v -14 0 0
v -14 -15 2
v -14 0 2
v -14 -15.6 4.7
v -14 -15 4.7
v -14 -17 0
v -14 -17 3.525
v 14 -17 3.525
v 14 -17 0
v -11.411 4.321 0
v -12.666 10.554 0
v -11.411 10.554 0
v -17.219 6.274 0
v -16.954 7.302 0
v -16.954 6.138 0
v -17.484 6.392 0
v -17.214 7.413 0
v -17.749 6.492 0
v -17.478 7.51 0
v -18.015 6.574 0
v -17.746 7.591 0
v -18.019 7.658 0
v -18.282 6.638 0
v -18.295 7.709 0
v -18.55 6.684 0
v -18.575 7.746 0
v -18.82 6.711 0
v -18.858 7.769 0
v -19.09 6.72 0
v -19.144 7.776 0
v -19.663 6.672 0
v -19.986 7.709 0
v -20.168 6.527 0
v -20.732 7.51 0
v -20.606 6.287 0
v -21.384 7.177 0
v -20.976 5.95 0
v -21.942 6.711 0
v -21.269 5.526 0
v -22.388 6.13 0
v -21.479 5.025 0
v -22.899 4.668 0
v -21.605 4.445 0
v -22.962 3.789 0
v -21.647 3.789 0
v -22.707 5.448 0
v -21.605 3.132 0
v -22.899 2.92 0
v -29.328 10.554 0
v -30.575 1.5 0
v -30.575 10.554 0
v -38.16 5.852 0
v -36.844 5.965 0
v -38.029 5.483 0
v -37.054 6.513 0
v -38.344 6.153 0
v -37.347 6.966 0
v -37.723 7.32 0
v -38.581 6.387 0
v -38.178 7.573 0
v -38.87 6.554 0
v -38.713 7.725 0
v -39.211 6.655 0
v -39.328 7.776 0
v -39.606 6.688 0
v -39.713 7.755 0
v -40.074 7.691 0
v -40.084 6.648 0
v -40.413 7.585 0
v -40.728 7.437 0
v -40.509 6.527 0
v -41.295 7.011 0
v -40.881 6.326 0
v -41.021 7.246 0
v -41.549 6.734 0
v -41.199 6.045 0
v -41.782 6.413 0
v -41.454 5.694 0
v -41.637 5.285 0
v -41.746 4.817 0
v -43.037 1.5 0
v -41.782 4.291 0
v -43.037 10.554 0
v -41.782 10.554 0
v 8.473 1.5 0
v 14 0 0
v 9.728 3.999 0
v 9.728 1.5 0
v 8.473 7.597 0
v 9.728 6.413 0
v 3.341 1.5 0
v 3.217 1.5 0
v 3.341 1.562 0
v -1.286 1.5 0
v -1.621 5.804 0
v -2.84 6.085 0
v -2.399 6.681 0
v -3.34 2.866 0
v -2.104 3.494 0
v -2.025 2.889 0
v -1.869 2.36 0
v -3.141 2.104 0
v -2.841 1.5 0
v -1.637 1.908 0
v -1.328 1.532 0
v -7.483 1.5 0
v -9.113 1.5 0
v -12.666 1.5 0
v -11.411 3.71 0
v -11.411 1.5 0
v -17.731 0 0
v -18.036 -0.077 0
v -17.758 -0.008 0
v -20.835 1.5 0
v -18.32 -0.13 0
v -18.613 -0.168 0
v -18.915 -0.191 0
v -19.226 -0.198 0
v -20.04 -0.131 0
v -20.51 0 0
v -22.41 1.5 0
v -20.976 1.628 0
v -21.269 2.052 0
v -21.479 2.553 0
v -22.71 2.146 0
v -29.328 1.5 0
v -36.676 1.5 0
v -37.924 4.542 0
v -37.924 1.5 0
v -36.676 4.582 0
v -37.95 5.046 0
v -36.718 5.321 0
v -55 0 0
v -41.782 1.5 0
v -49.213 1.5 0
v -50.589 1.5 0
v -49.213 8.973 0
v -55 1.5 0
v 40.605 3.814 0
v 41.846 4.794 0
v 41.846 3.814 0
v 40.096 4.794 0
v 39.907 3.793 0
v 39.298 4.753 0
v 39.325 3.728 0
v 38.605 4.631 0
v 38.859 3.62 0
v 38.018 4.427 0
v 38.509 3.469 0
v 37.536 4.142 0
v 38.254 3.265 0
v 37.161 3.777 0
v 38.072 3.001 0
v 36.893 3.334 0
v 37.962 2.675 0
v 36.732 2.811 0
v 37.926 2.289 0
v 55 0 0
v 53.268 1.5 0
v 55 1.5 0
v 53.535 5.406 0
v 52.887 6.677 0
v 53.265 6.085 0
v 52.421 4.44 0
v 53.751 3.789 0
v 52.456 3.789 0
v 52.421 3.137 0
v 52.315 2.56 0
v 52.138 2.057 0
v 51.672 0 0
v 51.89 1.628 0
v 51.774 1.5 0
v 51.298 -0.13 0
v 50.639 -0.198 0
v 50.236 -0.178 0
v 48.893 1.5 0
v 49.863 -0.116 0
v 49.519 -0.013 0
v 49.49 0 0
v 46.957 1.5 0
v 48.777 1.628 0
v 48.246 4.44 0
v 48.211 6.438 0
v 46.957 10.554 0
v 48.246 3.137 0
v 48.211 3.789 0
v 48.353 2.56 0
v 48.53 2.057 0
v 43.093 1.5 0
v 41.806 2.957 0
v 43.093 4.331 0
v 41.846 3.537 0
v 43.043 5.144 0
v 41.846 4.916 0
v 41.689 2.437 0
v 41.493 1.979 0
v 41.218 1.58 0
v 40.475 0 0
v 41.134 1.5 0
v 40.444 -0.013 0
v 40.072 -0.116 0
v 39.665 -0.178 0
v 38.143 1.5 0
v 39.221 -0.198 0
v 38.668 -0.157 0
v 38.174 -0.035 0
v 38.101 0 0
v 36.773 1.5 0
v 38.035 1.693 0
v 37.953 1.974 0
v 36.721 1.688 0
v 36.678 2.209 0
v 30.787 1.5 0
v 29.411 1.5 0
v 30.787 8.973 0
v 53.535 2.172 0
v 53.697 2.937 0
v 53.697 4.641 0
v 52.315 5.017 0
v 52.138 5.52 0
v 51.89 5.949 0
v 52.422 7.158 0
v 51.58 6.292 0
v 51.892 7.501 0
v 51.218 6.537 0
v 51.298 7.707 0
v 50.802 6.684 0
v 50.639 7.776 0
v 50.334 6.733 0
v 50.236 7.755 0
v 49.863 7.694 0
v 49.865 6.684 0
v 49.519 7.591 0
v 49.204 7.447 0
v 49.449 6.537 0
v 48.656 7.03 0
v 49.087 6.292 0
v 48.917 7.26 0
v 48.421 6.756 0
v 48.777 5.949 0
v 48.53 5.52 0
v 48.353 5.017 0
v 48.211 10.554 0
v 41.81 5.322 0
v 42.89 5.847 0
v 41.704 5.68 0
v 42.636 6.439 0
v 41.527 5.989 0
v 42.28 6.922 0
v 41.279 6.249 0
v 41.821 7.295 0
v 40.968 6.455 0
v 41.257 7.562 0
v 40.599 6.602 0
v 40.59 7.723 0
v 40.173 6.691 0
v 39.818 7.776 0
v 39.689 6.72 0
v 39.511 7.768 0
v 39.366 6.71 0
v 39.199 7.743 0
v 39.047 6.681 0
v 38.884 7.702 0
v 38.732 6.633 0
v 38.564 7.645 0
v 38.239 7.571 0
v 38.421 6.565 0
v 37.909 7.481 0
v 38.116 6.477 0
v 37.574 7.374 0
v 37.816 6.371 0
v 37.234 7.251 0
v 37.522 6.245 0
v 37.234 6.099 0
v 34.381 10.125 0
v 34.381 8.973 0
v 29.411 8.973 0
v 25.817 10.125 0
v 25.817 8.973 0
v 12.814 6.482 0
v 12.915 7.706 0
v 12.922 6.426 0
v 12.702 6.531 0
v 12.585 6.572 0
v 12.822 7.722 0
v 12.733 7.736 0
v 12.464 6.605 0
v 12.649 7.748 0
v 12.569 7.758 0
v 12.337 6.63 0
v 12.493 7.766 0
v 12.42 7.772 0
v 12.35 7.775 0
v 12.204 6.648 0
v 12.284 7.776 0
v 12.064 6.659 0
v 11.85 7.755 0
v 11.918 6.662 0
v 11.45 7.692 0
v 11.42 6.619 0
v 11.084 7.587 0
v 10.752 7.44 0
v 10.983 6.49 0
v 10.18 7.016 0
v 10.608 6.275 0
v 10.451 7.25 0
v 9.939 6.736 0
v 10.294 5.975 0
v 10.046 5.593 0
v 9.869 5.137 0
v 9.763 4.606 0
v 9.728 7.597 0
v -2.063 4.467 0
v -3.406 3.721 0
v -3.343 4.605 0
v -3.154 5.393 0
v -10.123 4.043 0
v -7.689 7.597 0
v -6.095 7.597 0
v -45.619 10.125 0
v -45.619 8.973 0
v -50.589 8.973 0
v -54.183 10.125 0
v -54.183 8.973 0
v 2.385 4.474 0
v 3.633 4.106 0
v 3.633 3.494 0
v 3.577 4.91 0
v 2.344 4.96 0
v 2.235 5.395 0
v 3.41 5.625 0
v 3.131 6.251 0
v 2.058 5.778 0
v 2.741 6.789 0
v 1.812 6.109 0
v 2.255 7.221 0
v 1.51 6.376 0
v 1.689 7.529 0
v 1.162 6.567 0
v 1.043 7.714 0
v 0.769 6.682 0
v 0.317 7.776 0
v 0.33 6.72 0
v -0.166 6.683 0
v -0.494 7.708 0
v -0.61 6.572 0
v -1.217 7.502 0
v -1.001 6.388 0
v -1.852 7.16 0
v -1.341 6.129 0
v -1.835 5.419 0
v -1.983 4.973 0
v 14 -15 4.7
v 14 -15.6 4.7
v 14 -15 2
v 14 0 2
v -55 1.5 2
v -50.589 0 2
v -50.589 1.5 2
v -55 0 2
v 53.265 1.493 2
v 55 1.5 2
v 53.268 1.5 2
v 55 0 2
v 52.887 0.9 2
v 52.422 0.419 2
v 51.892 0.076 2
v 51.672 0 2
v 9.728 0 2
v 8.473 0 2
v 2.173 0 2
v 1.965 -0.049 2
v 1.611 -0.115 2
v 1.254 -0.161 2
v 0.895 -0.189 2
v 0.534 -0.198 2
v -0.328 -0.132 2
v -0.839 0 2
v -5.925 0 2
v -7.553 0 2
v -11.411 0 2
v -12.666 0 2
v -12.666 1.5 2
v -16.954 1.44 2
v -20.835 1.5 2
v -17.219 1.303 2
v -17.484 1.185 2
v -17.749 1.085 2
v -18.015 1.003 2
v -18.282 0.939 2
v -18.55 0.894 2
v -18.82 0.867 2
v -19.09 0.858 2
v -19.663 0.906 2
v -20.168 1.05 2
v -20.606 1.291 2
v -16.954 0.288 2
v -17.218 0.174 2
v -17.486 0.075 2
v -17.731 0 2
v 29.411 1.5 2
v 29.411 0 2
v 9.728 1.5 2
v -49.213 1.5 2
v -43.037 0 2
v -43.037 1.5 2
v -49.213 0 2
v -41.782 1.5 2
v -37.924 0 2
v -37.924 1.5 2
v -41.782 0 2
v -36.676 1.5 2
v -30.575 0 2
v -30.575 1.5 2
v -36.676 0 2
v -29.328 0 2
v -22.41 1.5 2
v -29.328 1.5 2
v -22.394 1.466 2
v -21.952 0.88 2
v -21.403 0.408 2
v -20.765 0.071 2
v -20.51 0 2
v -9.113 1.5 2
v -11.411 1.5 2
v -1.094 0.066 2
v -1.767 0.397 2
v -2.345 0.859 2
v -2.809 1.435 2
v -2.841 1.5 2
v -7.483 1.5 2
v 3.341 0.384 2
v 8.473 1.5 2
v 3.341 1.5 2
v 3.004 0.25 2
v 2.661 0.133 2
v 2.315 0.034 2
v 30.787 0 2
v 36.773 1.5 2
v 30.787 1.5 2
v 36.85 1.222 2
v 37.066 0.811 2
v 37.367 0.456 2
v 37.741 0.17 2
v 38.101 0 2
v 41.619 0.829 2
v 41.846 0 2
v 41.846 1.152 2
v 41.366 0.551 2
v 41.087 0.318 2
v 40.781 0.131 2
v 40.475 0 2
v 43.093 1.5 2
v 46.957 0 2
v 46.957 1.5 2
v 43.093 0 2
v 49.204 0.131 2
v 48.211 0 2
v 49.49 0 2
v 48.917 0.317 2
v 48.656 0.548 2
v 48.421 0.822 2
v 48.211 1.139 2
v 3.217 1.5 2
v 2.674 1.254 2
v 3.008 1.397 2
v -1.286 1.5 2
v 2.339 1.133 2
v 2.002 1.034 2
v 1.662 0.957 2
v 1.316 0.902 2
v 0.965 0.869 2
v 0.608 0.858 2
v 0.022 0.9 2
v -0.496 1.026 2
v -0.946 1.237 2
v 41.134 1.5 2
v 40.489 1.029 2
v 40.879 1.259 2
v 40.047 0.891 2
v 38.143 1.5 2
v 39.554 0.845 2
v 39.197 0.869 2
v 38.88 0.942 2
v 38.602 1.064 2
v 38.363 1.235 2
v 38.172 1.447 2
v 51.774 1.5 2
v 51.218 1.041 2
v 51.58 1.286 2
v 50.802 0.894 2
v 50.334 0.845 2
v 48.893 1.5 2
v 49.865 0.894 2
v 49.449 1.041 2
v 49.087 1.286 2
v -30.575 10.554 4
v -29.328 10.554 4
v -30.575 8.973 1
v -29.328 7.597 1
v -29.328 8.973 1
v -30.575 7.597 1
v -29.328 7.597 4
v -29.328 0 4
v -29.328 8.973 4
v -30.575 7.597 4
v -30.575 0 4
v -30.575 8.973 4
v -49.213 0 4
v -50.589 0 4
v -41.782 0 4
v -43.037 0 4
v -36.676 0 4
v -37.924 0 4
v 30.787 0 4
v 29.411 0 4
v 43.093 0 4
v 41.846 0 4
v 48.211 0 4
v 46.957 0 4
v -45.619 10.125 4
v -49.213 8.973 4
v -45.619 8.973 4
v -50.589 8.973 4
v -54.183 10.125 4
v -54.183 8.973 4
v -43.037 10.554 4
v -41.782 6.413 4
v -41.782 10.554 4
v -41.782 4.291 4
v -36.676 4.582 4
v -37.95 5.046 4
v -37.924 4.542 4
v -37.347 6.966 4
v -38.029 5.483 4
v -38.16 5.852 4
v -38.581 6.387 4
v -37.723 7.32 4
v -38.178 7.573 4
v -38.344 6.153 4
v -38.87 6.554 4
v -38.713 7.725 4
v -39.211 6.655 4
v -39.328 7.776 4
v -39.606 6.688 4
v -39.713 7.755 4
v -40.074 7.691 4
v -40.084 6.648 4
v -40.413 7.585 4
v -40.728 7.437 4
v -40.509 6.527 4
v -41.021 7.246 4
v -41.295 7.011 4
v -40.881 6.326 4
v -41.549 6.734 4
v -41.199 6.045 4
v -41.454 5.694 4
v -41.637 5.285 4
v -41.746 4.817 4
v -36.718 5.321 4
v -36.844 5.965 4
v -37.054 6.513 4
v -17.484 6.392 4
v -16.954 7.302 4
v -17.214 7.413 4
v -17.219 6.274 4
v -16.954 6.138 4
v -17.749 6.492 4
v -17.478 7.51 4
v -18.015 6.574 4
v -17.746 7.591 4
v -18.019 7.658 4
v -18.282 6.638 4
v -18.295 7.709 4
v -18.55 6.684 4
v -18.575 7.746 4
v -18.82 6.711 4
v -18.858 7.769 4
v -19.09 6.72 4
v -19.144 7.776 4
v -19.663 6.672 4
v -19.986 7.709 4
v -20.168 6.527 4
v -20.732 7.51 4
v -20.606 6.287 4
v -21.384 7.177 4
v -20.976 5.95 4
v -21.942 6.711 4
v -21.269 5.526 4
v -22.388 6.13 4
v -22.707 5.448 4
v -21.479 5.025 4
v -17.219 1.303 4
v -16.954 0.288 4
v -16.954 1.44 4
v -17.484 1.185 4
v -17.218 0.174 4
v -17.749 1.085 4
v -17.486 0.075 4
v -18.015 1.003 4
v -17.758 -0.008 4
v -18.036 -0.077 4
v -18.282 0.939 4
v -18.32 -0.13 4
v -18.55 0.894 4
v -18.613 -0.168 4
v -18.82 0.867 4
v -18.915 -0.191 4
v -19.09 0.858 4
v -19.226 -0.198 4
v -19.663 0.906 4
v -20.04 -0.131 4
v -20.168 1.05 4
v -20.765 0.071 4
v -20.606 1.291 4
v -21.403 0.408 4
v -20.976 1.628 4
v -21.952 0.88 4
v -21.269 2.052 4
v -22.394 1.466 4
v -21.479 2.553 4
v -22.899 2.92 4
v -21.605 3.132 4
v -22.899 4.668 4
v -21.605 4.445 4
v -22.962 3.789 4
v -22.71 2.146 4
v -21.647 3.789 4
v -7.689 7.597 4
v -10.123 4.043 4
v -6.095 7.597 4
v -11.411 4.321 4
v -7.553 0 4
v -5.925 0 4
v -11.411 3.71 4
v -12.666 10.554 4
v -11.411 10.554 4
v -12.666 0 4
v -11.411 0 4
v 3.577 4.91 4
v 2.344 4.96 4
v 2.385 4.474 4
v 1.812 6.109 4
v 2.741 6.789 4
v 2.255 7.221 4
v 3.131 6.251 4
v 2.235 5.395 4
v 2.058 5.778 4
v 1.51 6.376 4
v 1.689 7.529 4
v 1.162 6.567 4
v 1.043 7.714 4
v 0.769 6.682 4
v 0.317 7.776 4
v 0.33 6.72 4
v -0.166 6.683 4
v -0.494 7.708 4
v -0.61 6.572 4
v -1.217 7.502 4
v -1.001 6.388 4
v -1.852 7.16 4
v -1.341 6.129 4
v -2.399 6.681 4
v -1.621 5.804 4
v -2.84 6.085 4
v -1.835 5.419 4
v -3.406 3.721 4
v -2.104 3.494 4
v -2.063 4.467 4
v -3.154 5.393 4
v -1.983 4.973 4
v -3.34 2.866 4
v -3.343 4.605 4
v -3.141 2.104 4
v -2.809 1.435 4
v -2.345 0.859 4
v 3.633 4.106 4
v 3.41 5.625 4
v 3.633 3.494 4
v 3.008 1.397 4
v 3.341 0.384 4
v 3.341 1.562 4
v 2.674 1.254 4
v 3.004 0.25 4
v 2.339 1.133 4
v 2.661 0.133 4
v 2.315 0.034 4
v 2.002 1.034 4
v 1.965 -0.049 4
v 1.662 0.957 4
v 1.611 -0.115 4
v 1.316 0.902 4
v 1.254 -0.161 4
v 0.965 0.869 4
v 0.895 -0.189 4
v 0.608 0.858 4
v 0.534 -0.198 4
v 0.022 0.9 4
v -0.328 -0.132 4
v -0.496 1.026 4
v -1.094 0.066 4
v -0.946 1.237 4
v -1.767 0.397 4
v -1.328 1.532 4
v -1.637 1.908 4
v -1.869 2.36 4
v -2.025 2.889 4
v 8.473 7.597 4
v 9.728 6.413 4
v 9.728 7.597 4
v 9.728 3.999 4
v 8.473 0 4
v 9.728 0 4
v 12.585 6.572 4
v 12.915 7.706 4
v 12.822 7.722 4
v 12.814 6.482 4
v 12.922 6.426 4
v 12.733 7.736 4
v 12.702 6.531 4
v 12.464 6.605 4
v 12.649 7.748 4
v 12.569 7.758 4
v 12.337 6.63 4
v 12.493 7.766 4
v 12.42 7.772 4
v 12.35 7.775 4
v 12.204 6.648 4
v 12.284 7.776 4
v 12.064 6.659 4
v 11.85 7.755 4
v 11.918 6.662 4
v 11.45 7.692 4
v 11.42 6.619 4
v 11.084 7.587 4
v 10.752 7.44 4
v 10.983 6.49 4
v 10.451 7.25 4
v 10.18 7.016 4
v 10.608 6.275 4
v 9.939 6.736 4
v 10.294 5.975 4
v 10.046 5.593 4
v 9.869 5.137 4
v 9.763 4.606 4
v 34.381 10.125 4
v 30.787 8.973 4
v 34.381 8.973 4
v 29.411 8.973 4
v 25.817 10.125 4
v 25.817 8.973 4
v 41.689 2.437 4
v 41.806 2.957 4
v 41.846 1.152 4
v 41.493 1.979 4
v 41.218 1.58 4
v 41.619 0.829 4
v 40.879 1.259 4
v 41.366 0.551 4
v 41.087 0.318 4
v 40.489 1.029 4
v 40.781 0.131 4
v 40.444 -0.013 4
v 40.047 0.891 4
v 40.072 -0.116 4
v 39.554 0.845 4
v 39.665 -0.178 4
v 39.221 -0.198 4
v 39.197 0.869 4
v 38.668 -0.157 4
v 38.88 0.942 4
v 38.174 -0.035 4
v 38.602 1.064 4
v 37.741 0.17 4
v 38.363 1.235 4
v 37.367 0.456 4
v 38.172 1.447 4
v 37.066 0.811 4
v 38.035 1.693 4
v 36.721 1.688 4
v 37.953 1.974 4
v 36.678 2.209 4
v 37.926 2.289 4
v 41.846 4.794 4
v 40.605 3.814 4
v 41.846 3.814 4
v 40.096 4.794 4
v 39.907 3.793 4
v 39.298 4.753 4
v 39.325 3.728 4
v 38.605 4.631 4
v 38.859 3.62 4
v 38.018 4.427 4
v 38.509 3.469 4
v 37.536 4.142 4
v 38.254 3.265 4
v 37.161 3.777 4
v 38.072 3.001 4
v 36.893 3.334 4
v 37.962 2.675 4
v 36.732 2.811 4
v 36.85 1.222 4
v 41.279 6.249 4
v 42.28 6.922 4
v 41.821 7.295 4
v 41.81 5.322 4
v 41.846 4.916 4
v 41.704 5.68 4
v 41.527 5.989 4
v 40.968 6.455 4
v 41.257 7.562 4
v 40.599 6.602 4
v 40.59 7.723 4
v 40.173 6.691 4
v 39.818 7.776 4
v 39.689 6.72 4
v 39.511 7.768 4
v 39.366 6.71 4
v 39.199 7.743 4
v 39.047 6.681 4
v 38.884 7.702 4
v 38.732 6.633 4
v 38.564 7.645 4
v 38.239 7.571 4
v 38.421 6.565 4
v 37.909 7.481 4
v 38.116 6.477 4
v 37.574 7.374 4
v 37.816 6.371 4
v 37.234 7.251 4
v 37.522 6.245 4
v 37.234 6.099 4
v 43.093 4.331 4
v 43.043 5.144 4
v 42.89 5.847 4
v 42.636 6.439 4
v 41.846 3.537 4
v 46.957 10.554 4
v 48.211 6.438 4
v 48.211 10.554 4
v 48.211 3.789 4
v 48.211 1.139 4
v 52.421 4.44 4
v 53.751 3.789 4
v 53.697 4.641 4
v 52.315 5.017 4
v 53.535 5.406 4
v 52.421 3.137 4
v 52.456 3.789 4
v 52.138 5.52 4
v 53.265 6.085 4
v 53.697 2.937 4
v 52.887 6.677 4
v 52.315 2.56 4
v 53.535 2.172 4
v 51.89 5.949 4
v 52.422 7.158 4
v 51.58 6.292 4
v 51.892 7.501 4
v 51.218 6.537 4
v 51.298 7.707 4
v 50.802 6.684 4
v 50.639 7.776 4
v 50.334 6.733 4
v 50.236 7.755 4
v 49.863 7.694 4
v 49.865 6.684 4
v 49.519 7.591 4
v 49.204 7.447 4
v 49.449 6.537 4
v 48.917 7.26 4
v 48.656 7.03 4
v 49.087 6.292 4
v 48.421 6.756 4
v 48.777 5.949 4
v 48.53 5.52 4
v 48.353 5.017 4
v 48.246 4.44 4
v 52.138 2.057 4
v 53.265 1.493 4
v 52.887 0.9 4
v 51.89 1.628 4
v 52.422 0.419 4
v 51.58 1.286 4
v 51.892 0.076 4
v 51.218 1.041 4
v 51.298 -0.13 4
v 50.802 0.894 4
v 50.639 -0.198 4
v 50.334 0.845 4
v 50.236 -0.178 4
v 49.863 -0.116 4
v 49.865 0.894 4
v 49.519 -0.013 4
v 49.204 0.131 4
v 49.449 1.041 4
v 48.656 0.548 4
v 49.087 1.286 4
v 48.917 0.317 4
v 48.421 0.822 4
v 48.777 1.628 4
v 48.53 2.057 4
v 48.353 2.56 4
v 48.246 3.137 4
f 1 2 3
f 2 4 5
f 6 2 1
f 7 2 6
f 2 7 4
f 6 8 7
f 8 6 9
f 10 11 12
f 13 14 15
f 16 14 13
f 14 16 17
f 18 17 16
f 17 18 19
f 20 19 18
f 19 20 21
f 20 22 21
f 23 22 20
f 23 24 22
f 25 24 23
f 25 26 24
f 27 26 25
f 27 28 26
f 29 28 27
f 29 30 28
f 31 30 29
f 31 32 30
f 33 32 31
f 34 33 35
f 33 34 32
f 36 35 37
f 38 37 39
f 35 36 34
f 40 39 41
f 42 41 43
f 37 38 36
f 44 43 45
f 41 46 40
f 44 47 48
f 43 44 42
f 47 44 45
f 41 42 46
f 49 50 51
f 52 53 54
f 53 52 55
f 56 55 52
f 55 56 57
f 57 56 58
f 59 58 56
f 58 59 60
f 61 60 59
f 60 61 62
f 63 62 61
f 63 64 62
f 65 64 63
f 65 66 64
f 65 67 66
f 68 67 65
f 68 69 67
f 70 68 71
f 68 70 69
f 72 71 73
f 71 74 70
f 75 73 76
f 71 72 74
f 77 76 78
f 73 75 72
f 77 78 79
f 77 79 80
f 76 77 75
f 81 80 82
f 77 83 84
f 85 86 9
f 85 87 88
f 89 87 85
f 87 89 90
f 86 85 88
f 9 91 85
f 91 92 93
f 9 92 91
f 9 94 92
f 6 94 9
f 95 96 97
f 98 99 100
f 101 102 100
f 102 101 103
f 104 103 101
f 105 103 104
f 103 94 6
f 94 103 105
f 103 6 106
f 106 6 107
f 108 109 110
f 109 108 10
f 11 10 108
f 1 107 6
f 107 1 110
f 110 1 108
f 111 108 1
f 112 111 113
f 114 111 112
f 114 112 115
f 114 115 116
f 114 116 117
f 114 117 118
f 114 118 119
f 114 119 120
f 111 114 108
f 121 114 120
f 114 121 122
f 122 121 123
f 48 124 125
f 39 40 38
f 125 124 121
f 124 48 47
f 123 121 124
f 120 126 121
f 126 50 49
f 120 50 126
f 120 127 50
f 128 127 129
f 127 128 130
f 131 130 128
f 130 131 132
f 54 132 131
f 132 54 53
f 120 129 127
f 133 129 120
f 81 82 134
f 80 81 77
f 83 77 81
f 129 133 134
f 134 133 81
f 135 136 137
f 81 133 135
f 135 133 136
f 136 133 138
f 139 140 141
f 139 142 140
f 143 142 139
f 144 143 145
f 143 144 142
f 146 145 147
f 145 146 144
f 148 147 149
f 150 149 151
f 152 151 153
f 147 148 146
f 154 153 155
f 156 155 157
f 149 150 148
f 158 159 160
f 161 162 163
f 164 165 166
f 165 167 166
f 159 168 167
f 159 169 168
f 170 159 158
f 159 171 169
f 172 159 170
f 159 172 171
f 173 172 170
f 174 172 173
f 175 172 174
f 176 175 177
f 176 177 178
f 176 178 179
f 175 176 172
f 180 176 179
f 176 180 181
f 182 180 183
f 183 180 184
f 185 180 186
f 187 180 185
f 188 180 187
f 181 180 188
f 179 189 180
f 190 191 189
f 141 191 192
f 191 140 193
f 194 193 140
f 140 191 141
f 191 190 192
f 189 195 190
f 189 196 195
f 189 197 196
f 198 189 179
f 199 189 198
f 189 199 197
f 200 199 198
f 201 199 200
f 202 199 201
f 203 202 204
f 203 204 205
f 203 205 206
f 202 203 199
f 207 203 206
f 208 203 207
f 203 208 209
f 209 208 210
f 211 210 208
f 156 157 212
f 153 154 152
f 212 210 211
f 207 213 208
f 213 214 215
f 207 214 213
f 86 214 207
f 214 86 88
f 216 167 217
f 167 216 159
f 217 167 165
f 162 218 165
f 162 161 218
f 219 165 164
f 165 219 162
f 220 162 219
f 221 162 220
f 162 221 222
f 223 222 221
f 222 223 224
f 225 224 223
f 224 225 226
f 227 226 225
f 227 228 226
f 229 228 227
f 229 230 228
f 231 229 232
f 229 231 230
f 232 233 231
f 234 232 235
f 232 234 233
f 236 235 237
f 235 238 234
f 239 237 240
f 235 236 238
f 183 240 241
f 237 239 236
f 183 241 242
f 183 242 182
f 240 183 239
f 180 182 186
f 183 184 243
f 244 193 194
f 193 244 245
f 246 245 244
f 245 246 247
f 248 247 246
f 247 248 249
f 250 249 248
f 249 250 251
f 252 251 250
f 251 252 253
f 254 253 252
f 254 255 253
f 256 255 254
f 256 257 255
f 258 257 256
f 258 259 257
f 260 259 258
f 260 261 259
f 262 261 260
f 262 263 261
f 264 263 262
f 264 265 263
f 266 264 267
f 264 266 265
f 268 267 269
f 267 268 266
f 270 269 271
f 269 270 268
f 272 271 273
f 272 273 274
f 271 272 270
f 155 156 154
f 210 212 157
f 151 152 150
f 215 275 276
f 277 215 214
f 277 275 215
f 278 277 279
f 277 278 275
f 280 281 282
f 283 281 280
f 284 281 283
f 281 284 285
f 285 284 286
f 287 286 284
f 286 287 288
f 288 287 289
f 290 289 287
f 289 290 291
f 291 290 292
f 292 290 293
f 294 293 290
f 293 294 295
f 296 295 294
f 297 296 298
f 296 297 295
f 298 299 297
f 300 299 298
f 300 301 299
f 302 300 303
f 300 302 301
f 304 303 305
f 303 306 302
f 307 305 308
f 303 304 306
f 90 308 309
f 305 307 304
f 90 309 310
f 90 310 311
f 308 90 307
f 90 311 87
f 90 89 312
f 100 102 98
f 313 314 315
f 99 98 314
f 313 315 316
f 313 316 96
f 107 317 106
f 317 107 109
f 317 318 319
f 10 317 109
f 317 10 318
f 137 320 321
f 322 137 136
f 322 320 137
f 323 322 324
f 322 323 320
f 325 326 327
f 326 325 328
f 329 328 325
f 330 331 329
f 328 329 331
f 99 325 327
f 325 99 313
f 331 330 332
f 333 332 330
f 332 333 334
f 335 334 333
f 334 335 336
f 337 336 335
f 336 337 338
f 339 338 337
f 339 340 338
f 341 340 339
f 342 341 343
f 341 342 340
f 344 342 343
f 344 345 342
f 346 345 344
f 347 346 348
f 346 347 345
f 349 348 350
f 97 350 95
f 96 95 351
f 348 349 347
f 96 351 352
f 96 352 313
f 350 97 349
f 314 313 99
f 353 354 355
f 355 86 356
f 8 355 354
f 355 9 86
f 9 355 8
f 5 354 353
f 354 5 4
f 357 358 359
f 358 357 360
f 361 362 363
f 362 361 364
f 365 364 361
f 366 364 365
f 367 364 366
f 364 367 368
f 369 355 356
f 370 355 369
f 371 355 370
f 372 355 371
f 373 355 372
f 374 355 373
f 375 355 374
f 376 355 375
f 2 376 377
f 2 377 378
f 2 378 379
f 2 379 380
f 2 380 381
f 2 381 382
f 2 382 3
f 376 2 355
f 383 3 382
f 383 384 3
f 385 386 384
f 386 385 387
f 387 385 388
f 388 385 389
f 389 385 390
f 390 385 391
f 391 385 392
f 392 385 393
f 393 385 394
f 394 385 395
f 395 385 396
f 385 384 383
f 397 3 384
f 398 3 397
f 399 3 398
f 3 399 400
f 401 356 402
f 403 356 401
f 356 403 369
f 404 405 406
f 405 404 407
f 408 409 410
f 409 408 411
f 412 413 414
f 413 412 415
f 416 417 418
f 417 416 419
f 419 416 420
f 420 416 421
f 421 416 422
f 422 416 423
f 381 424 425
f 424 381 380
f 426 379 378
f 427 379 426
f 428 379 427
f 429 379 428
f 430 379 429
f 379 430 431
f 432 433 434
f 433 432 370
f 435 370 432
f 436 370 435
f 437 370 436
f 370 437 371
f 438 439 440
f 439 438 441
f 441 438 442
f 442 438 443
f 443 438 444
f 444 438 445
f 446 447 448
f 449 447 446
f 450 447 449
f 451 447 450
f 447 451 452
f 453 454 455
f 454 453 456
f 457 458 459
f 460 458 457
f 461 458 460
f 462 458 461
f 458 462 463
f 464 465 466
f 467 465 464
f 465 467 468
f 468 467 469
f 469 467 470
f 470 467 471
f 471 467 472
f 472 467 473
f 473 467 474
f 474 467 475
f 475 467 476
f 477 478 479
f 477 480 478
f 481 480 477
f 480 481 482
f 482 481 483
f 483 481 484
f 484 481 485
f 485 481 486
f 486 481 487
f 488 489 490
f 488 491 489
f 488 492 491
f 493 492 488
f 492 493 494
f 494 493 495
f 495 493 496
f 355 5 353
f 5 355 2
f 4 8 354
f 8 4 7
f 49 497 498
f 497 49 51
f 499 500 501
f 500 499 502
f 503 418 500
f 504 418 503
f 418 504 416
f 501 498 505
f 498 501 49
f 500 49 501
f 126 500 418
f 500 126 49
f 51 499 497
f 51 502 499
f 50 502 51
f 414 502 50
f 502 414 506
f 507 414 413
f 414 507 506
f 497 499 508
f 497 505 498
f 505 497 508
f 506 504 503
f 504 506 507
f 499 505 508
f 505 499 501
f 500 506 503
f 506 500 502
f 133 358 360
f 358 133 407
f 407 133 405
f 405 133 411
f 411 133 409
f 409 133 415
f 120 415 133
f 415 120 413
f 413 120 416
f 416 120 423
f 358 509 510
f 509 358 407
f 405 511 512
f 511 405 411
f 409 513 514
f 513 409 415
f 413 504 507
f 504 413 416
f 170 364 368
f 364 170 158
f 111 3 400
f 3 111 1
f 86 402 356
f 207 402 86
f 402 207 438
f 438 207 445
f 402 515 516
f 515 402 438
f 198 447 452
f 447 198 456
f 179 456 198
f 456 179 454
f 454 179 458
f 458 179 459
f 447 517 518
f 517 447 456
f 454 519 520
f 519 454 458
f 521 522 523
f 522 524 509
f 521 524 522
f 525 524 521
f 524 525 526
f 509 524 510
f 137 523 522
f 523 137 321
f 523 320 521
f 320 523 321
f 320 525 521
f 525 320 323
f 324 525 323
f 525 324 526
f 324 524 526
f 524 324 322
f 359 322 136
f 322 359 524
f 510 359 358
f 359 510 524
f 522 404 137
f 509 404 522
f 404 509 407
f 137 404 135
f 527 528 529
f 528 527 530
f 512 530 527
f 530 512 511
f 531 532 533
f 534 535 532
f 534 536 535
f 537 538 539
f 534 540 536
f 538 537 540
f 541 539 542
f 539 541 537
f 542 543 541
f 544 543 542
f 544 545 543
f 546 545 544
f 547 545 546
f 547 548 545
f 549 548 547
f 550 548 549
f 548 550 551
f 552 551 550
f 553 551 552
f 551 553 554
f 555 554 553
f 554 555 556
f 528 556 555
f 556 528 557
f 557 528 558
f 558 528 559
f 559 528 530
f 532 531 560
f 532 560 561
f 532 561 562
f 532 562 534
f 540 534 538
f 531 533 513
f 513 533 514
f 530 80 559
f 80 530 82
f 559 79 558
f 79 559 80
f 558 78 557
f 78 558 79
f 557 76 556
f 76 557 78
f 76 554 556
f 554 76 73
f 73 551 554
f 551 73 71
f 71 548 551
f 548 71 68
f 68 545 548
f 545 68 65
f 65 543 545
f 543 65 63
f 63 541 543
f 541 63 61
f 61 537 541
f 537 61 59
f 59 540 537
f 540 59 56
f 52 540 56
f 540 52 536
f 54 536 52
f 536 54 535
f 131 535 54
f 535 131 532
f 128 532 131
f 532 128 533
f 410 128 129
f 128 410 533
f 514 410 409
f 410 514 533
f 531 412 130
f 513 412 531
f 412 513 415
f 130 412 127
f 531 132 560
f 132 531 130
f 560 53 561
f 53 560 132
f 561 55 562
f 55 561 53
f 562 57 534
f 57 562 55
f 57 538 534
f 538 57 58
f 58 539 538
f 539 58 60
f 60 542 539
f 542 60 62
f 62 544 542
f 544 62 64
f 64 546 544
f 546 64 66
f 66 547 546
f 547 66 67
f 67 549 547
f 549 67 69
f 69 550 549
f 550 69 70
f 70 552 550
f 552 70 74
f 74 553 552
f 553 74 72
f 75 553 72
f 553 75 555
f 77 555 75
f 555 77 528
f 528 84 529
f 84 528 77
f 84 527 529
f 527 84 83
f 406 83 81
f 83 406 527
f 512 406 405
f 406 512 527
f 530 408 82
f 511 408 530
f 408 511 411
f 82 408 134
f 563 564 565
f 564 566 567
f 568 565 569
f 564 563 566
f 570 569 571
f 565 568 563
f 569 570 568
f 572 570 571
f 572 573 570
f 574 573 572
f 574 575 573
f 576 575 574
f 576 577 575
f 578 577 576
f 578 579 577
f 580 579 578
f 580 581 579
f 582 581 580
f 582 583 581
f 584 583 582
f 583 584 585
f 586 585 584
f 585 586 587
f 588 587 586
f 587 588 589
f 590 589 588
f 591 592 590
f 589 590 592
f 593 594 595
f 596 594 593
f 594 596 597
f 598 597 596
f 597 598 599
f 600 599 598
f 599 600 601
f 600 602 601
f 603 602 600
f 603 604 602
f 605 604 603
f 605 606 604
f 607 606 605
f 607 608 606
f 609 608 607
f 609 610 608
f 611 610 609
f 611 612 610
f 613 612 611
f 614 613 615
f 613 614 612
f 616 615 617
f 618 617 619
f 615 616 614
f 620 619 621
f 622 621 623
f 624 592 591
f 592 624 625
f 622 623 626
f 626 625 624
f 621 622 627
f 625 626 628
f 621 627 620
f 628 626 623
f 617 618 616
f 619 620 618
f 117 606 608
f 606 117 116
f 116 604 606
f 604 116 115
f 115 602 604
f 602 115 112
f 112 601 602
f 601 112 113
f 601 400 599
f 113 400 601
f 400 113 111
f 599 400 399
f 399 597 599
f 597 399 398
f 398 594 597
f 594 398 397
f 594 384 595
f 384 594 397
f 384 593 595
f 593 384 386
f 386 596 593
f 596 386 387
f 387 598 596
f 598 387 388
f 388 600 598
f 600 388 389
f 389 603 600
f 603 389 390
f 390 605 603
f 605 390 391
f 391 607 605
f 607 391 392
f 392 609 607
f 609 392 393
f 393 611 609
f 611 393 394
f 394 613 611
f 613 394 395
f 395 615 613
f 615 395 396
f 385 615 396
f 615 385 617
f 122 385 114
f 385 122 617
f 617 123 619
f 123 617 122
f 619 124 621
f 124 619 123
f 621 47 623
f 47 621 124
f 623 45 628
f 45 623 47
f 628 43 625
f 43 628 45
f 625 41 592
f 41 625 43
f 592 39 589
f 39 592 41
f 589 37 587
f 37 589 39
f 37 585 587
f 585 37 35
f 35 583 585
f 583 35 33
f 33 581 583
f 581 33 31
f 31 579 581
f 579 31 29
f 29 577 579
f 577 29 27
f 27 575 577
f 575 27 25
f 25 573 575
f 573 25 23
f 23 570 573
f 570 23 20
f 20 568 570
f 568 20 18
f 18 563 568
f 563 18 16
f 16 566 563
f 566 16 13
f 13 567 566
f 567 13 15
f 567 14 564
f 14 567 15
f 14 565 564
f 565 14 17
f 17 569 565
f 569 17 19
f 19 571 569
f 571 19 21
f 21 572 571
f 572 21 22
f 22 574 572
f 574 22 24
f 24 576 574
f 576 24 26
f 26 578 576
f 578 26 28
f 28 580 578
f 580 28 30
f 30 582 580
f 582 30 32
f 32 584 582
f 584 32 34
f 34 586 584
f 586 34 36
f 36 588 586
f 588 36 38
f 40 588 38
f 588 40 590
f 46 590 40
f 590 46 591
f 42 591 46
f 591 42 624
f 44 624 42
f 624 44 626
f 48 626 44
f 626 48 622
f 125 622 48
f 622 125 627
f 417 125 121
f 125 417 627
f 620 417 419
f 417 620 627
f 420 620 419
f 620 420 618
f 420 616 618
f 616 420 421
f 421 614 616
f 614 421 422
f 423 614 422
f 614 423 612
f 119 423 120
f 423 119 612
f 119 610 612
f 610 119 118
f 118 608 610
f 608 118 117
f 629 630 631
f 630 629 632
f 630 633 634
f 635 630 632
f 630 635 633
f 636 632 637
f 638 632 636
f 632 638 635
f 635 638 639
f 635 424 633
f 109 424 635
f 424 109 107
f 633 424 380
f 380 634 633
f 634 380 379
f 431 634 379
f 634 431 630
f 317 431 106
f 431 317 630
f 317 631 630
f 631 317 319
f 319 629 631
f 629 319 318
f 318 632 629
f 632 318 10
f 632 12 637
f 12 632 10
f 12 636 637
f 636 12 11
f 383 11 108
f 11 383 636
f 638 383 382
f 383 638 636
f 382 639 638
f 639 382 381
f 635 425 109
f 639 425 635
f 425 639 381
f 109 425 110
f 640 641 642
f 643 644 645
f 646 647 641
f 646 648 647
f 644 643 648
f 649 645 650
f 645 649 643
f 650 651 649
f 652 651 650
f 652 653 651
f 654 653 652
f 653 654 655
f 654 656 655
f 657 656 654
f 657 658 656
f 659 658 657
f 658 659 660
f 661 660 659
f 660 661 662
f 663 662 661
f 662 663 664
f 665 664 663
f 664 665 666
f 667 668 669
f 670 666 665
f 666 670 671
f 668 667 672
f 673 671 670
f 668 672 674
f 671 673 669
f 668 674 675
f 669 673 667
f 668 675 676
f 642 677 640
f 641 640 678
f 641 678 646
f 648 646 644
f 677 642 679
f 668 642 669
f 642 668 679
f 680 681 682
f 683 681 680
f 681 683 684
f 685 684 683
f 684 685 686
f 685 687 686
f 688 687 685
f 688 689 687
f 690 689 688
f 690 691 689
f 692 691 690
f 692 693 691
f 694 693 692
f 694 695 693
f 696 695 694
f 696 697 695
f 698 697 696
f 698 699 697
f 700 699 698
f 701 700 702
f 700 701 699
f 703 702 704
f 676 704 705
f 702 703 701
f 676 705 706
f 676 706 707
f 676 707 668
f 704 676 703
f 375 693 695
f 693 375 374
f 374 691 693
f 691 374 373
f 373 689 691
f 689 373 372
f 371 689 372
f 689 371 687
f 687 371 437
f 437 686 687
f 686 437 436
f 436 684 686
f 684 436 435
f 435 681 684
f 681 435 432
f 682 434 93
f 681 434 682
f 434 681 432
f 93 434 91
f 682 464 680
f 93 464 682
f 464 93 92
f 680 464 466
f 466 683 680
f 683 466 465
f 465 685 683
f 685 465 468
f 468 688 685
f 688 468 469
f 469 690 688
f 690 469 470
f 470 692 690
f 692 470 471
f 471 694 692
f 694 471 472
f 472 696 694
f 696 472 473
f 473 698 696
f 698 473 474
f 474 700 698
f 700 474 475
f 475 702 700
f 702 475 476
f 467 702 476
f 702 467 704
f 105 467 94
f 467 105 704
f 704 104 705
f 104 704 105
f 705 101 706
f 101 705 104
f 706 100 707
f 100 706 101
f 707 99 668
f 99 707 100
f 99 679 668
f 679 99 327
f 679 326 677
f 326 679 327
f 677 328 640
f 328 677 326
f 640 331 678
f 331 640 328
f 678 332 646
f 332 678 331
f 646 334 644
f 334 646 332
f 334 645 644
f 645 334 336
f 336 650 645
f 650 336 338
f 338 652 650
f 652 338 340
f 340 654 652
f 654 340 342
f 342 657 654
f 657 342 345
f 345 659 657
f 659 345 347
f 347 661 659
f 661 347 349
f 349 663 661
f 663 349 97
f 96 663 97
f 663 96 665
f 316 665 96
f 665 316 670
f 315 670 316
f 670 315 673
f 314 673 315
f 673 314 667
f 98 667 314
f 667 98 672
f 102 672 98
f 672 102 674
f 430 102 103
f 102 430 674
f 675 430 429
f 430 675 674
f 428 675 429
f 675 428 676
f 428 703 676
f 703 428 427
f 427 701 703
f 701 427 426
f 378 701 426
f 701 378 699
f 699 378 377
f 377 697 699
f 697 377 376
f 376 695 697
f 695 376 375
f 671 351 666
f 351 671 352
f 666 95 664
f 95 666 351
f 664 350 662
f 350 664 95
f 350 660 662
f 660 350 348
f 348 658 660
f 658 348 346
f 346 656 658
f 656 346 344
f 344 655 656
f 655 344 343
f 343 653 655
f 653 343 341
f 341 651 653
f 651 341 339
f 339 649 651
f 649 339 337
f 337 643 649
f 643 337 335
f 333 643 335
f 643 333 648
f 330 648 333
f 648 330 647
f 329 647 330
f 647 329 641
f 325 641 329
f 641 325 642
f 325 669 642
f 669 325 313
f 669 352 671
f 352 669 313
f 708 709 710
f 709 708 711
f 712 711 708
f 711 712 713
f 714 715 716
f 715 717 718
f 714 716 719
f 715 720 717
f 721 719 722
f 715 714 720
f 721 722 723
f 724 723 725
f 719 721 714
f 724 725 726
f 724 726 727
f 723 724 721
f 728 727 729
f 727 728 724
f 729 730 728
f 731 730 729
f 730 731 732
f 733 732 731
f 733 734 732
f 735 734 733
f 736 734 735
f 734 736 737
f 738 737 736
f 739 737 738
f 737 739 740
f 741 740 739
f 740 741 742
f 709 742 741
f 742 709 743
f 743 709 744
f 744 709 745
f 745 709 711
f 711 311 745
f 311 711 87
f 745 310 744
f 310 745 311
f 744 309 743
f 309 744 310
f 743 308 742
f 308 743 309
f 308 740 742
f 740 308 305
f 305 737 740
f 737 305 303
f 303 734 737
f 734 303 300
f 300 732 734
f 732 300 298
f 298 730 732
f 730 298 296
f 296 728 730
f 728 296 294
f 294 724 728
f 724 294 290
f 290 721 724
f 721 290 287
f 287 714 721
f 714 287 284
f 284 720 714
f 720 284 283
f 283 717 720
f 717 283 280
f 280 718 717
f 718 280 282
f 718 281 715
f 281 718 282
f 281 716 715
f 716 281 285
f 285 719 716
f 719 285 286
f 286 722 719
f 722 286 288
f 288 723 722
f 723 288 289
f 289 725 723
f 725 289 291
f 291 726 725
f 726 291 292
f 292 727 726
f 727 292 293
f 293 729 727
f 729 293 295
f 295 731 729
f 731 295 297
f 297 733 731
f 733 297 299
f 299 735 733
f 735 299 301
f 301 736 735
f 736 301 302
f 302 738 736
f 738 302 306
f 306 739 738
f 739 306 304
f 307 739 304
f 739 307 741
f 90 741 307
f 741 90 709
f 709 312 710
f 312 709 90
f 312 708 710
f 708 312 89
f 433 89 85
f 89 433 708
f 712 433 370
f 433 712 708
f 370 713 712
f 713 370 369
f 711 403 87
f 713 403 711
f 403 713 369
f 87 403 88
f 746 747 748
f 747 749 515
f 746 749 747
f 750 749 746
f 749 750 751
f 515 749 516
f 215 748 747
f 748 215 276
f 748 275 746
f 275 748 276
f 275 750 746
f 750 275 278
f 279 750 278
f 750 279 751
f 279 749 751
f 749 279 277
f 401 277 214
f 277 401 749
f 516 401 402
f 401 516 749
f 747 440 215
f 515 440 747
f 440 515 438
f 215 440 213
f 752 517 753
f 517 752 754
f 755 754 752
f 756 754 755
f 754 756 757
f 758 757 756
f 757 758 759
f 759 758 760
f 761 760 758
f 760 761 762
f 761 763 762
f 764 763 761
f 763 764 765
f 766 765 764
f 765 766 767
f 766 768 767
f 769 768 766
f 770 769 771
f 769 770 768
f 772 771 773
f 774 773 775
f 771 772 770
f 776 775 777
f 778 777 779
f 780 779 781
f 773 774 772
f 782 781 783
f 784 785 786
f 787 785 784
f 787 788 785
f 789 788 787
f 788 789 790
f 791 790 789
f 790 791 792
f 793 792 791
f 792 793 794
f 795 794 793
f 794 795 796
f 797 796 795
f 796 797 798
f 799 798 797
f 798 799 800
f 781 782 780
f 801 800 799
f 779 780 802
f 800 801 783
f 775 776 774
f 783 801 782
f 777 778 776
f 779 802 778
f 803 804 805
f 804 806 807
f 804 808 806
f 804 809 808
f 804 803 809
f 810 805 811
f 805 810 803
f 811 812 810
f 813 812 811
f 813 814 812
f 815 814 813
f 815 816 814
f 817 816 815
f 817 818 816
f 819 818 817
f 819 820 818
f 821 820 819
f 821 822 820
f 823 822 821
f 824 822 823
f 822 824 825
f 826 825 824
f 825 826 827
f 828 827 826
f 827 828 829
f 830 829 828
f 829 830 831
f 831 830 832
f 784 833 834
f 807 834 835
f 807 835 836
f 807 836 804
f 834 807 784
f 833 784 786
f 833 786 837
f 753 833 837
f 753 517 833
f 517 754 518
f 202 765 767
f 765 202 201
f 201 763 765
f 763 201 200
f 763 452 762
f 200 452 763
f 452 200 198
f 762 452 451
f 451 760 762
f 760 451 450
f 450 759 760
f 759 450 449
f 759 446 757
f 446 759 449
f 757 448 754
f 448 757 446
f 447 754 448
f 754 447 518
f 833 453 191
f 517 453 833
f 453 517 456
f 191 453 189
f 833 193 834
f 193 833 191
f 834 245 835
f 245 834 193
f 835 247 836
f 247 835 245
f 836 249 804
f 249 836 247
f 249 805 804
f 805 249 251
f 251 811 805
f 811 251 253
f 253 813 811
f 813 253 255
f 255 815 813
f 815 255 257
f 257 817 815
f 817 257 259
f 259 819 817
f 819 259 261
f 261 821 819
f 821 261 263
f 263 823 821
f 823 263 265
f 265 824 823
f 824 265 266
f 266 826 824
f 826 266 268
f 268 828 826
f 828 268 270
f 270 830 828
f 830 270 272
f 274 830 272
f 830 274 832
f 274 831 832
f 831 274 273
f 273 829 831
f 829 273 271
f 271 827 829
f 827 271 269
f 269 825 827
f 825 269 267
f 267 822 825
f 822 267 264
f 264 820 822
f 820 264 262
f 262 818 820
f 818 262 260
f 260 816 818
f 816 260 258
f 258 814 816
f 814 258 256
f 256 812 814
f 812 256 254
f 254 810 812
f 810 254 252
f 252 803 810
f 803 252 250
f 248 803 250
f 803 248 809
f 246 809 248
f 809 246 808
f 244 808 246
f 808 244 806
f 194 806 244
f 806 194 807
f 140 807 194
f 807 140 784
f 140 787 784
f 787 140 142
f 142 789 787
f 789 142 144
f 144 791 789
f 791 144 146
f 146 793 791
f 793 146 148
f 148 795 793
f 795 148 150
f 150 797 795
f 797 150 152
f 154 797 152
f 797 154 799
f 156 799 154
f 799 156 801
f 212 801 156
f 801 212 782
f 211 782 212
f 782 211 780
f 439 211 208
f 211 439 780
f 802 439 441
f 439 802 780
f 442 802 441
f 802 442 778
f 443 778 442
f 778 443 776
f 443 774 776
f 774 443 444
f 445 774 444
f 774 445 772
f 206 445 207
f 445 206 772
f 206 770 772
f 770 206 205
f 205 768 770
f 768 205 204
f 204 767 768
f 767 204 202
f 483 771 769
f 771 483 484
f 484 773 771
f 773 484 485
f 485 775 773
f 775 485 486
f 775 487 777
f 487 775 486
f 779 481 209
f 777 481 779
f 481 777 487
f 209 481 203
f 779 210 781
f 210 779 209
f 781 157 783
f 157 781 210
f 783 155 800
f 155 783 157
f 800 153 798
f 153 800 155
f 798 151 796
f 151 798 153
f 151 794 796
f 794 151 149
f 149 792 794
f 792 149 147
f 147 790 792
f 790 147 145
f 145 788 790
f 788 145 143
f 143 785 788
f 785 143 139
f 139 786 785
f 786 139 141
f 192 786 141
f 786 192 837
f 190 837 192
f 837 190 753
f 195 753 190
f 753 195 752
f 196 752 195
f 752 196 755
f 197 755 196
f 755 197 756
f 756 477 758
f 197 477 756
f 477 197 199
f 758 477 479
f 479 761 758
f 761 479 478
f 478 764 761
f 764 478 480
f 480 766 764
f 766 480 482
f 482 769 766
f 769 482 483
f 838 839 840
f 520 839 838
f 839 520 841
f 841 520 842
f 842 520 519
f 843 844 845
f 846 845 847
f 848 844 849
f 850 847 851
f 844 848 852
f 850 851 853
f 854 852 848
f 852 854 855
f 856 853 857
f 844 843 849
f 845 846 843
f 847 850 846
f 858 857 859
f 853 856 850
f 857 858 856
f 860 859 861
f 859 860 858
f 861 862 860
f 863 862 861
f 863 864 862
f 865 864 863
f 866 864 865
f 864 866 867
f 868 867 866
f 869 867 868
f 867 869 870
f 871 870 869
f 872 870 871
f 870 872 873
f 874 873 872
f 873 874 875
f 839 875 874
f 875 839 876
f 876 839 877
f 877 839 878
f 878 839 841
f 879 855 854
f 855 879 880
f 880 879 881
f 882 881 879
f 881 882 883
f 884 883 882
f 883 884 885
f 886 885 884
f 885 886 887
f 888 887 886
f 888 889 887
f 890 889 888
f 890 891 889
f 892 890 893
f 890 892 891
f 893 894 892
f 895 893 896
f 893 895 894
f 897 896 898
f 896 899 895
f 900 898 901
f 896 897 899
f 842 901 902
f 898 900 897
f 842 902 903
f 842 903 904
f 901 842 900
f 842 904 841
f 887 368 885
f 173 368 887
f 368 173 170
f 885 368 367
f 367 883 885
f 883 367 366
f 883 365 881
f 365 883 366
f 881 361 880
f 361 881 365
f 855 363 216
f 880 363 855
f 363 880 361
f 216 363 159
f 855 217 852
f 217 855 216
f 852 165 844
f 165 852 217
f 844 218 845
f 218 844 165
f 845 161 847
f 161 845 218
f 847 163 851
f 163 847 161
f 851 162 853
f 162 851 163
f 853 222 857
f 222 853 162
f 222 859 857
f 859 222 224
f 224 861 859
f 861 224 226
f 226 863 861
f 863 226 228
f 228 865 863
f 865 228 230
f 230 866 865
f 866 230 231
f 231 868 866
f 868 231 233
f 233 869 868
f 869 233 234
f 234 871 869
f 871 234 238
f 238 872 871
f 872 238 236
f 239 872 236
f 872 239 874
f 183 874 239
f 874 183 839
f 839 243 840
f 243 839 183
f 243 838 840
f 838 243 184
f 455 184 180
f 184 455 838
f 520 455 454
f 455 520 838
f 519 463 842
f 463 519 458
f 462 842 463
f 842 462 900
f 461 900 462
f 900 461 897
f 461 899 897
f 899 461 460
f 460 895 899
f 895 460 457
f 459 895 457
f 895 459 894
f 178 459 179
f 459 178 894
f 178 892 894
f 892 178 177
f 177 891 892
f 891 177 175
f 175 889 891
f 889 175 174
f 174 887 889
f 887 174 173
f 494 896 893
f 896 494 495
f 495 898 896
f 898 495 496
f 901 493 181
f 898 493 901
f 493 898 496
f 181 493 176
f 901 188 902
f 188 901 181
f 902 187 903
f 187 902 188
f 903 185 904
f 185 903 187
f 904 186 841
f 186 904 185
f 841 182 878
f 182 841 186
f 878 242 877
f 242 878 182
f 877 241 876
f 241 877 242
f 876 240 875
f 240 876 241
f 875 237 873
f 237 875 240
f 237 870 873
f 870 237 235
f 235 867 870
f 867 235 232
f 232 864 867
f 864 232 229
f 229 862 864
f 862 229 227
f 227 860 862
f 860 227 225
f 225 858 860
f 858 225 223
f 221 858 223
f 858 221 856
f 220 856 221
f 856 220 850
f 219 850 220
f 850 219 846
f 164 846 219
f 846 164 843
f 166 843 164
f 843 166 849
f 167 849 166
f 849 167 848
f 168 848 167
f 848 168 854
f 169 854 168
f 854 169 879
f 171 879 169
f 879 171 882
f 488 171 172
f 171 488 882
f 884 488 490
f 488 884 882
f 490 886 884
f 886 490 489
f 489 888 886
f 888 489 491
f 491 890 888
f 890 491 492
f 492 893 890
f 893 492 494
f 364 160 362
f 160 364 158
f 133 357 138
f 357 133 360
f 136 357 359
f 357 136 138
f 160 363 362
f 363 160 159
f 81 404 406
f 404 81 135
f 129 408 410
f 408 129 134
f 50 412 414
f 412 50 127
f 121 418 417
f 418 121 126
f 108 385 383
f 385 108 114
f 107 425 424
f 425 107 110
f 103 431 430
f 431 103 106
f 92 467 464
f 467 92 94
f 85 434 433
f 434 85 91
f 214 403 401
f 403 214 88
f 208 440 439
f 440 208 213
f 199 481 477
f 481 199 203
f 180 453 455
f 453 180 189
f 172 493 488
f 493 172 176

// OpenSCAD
//Hardhat accessory slot tab
//Writen by Dan Koss 1/2016. (Updated 1/23/16)
//Thanks to MC Geisler (thing:714444) for the font list. I'm still figuring out text and will trim don the list as I learn.
//Choose to import STL or Use custom text

/* [Add Text] */
//Text Line 1
line1 = "";
//Text Line 2
line2 = "";
//Text Line 3
line3 = "";
//Text Line 4
line4 = "Thicker Tab";

//Font name, e.g. "Libration Sans", "Aldo", depends on what is available on the platform. In the customizer,choose from about 700 Google Fonts. For an overview please refer: http://www.google.com/fonts
FontName="Alike"; //[ABeeZee,Abel,Abril Fatface,Aclonica,Acme,Actor,Adamina,Advent Pro,Aguafina Script,Akronim,Aladin,Aldrich,Alef,Alegreya,Alegreya Sans,Alegreya Sans SC,Alegreya SC,Alex Brush,Alfa Slab One,Alice,Alike,Alike Angular,Allan,Allerta,Allerta Stencil,Allura,Almendra,Almendra Display,Almendra SC,Amarante,Amaranth,Amatic SC,Amethysta,Amiri,Anaheim,Andada,Andika,Angkor,Annie Use Your Telescope,Anonymous Pro,Antic,Antic Didone,Antic Slab,Anton,Arapey,Arbutus,Arbutus Slab,Architects Daughter,Archivo Black,Archivo Narrow,Arimo,Arizonia,Armata,Artifika,Arvo,Asap,Asset,Astloch,Asul,Atomic Age,Aubrey,Audiowide,Autour One,Average,Average Sans,Averia Gruesa Libre,Averia Libre,Averia Sans Libre,Averia Serif Libre,Bad Script,Balthazar,Bangers,Basic,Battambang,Baumans,Bayon,Belgrano,Belleza,BenchNine,Bentham,Berkshire Swash,Bevan,Bigelow Rules,Bigshot One,Bilbo,Bilbo Swash Caps,Bitter,Black Ops One,Bokor,Bonbon,Boogaloo,Bowlby One,Bowlby One SC,Brawler,Bree Serif,Bubblegum Sans,Bubbler One,Buda,Buenard,Butcherman,Butterfly Kids,Cabin,Cabin Condensed,Cabin Sketch,Caesar Dressing,Cagliostro,Calligraffitti,Cambay,Cambo,Candal,Cantarell,Cantata One,Cantora One,Capriola,Cardo,Carme,Carrois Gothic,Carrois Gothic SC,Carter One,Caudex,Cedarville Cursive,Ceviche One,Changa One,Chango,Chau Philomene One,Chela One,Chelsea Market,Chenla,Cherry Cream Soda,Cherry Swash,Chewy,Chicle,Chivo,Cinzel,Cinzel Decorative,Clicker Script,Coda,Coda Caption,Codystar,Combo,Comfortaa,Coming Soon,Concert One,Condiment,Content,Contrail One,Convergence,Cookie,Copse,Corben,Courgette,Cousine,Coustard,Covered By Your Grace,Crafty Girls,Creepster,Crete Round,Crimson Text,Croissant One,Crushed,Cuprum,Cutive,Cutive Mono,Damion,Dancing Script,Dangrek,Dawning of a New Day,Days One,Dekko,Delius,Delius Swash Caps,Delius Unicase,Della Respira,Denk One,Devonshire,Dhurjati,Didact Gothic,Diplomata,Diplomata SC,Domine,Donegal One,Doppio One,Dorsa,Dosis,Dr Sugiyama,Droid Sans,Droid Sans Mono,Droid Serif,Duru Sans,Dynalight,Eagle Lake,Eater,EB Garamond,Economica,Ek Mukta,Electrolize,Elsie,Elsie Swash Caps,Emblema One,Emilys Candy,Engagement,Englebert,Enriqueta,Erica One,Esteban,Euphoria Script,Ewert,Exo,Exo 2,Expletus Sans,Fanwood Text,Fascinate,Fascinate Inline,Faster One,Fasthand,Fauna One,Federant,Federo,Felipa,Fenix,Finger Paint,Fira Mono,Fira Sans,Fjalla One,Fjord One,Flamenco,Flavors,Fondamento,Fontdiner Swanky,Forum,Francois One,Freckle Face,Fredericka the Great,Fredoka One,Freehand,Fresca,Frijole,Fruktur,Fugaz One,Gabriela,Gafata,Galdeano,Galindo,Gentium Basic,Gentium Book Basic,Geo,Geostar,Geostar Fill,Germania One,GFS Didot,GFS Neohellenic,Gidugu,Gilda Display,Give You Glory,Glass Antiqua,Glegoo,Gloria Hallelujah,Goblin One,Gochi Hand,Gorditas,Goudy Bookletter 1911,Graduate,Grand Hotel,Gravitas One,Great Vibes,Griffy,Gruppo,Gudea,Gurajada,Habibi,Halant,Hammersmith One,Hanalei,Hanalei Fill,Handlee,Hanuman,Happy Monkey,Headland One,Henny Penny,Herr Von Muellerhoff,Hind,Holtwood One SC,Homemade Apple,Homenaje,Iceberg,Iceland,IM Fell Double Pica,IM Fell Double Pica SC,IM Fell DW Pica,IM Fell DW Pica SC,IM Fell English,IM Fell English SC,IM Fell French Canon,IM Fell French Canon SC,IM Fell Great Primer,IM Fell Great Primer SC,Imprima,Inconsolata,Inder,Indie Flower,Inika,Irish Grover,Istok Web,Italiana,Italianno,Jacques Francois,Jacques Francois Shadow,Jim Nightshade,Jockey One,Jolly Lodger,Josefin Sans,Josefin Slab,Joti One,Judson,Julee,Julius Sans One,Junge,Jura,Just Another Hand,Just Me Again Down Here,Kalam,Kameron,Kantumruy,Karla,Karma,Kaushan Script,Kavoon,Kdam Thmor,Keania One,Kelly Slab,Kenia,Khand,Khmer,Khula,Kite One,Knewave,Kotta One,Koulen,Kranky,Kreon,Kristi,Krona One,La Belle Aurore,Laila,Lakki Reddy,Lancelot,Lateef,Lato,League Script,Leckerli One,Ledger,Lekton,Lemon,Liberation Sans,Libre Baskerville,Life Savers,Lilita One,Lily Script One,Limelight,Linden Hill,Lobster,Lobster Two,Londrina Outline,Londrina Shadow,Londrina Sketch,Londrina Solid,Lora,Love Ya Like A Sister,Loved by the King,Lovers Quarrel,Luckiest Guy,Lusitana,Lustria,Macondo,Macondo Swash Caps,Magra,Maiden Orange,Mako,Mallanna,Mandali,Marcellus,Marcellus SC,Marck Script,Margarine,Marko One,Marmelad,Martel Sans,Marvel,Mate,Mate SC,Maven Pro,McLaren,Meddon,MedievalSharp,Medula One,Megrim,Meie Script,Merienda,Merienda One,Merriweather,Merriweather Sans,Metal,Metal Mania,Metamorphous,Metrophobic,Michroma,Milonga,Miltonian,Miltonian Tattoo,Miniver,Miss Fajardose,Modak,Modern Antiqua,Molengo,Molle,Monda,Monofett,Monoton,Monsieur La Doulaise,Montaga,Montez,Montserrat,Montserrat Alternates,Montserrat Subrayada,Moul,Moulpali,Mountains of Christmas,Mouse Memoirs,Mr Bedfort,Mr Dafoe,Mr De Haviland,Mrs Saint Delafield,Mrs Sheppards,Muli,Mystery Quest,Neucha,Neuton,New Rocker,News Cycle,Niconne,Nixie One,Nobile,Nokora,Norican,Nosifer,Nothing You Could Do,Noticia Text,Noto Sans,Noto Serif,Nova Cut,Nova Flat,Nova Mono,Nova Oval,Nova Round,Nova Script,Nova Slim,Nova Square,NTR,Numans,Nunito,Odor Mean Chey,Offside,Old Standard TT,Oldenburg,Oleo Script,Oleo Script Swash Caps,Open Sans,Open Sans Condensed,Oranienbaum,Orbitron,Oregano,Orienta,Original Surfer,Oswald,Over the Rainbow,Overlock,Overlock SC,Ovo,Oxygen,Oxygen Mono,Pacifico,Paprika,Parisienne,Passero One,Passion One,Pathway Gothic One,Patrick Hand,Patrick Hand SC,Patua One,Paytone One,Peddana,Peralta,Permanent Marker,Petit Formal Script,Petrona,Philosopher,Piedra,Pinyon Script,Pirata One,Plaster,Play,Playball,Playfair Display,Playfair Display SC,Podkova,Poiret One,Poller One,Poly,Pompiere,Pontano Sans,Port Lligat Sans,Port Lligat Slab,Prata,Preahvihear,Press Start 2P,Princess Sofia,Prociono,Prosto One,PT Mono,PT Sans,PT Sans Caption,PT Sans Narrow,PT Serif,PT Serif Caption,Puritan,Purple Purse,Quando,Quantico,Quattrocento,Quattrocento Sans,Questrial,Quicksand,Quintessential,Qwigley,Racing Sans One,Radley,Rajdhani,Raleway,Raleway Dots,Ramabhadra,Ramaraja,Rambla,Rammetto One,Ranchers,Rancho,Ranga,Rationale,Ravi Prakash,Redressed,Reenie Beanie,Revalia,Ribeye,Ribeye Marrow,Righteous,Risque,Roboto,Roboto Condensed,Roboto Slab,Rochester,Rock Salt,Rokkitt,Romanesco,Ropa Sans,Rosario,Rosarivo,Rouge Script,Rozha One,Rubik Mono One,Rubik One,Ruda,Rufina,Ruge Boogie,Ruluko,Rum Raisin,Ruslan Display,Russo One,Ruthie,Rye,Sacramento,Sail,Salsa,Sanchez,Sancreek,Sansita One,Sarina,Sarpanch,Satisfy,Scada,Scheherazade,Schoolbell,Seaweed Script,Sevillana,Seymour One,Shadows Into Light,Shadows Into Light Two,Shanti,Share,Share Tech,Share Tech Mono,Shojumaru,Short Stack,Siemreap,Sigmar One,Signika,Signika Negative,Simonetta,Sintony,Sirin Stencil,Six Caps,Skranji,Slabo 13px,Slabo 27px,Slackey,Smokum,Smythe,Sniglet,Snippet,Snowburst One,Sofadi One,Sofia,Sonsie One,Sorts Mill Goudy,Source Code Pro,Source Sans Pro,Source Serif Pro,Special Elite,Spicy Rice,Spinnaker,Spirax,Squada One,Sree Krushnadevaraya,Stalemate,Stalinist One,Stardos Stencil,Stint Ultra Condensed,Stint Ultra Expanded,Stoke,Strait,Sue Ellen Francisco,Sunshiney,Supermercado One,Suranna,Suravaram,Suwannaphum,Swanky and Moo Moo,Syncopate,Tangerine,Taprom,Tauri,Teko,Telex,Tenali Ramakrishna,Tenor Sans,Text Me One,The Girl Next Door,Tienne,Timmana,Tinos,Titan One,Titillium Web,Trade Winds,Trocchi,Trochut,Trykker,Tulpen One,Ubuntu,Ubuntu Condensed,Ubuntu Mono,Ultra,Uncial Antiqua,Underdog,Unica One,UnifrakturCook,UnifrakturMaguntia,Unkempt,Unlock,Unna,Vampiro One,Varela,Varela Round,Vast Shadow,Vesper Libre,Vibur,Vidaloka,Viga,Voces,Volkhov,Vollkorn,Voltaire,VT323,Waiting for the Sunrise,Wallpoet,Walter Turncoat,Warnes,Wellfleet,Wendy One,Wire One,Yanone Kaffeesatz,Yellowtail,Yeseva One,Yesteryear,Zeyada]
//Font Size
FontSize = 10; //[1:.5:30]
//Font Spacing
FontSpace = 1; //[0:.1:2]
//Font Extrusion;
FontExtrude = 4; //[1:.1:10]
//Line Spacing
LineSpace = 1.1; //[0:.1:2]


/* [Hidden] */
stlortext = "text";

//The following is to import an STL File. Change "stlortext" to ="stl"
//and copy the STL file to the same folder as your .scad file
stlfile = "koss_insert.stl";
//Shift STL [x,y,z]
stlshift = [0,9,0];
//Scale STL [x,y,z] axis
stlscale = [1,1,1];
//Rotate STL about [x,y,z] axis
stlrotate = [0,0,0];

/* [Hidden] */
//Referenced constants for the TAB.
//Tshiftx = 15;
tabX = 28;
tabY = 15;
tabZ = 4.70;
tabHead = 1;
tabClip = 2;
rad=tabClip/2;

if (stlortext == "stl") {
    union(){
        translate([stlshift[0],stlshift[1],stlshift[2]]) scale([stlscale[0],stlscale[1],stlscale[2]]) rotate([stlrotate[0],stlrotate[1],stlrotate[2]]) import(stlfile);
        TAB();
    }
}
else if (stlortext == "text") {TextClip();}
else echo("error");


//
//Add Text. Line 4 at bottom and Line 1 at the Top
module TextClip (){
    union(){
        TAB();
        len_text = len(line4);
        translate([-((len_text)/2)*FontSize*FontSpace,0,0]) WriteText(line4,FontSize);
        translate([-((len_text)/2)*FontSize*FontSpace,0,0]) cube([(len_text)*FontSize*FontSpace,1.5,2]);
        
        if (line3 != "") {
            len_text = len(line3);
            translate([-((len_text)/2)*FontSize*FontSpace,FontSize*LineSpace,0]) WriteText(line3,FontSize);
            translate([-((len_text)/2)*FontSize*FontSpace,FontSize*LineSpace-1,0]) cube([(len_text)*FontSize*FontSpace,1.5+1+(FontSize*(LineSpace-1)),2]);
        }
        
        if (line2 != "") {
            len_text = len(line2);
            translate([-((len_text)/2)*FontSize*FontSpace,2*FontSize*LineSpace,0]) WriteText(line2, FontSize);
            translate([-((len_text)/2)*FontSize*FontSpace,2*(FontSize*LineSpace-1),0]) cube([(len_text)*FontSize*FontSpace,1.5+1+(FontSize*(LineSpace-1)),1]);
        }
        
        if (line1 != "") {
            len_text = len(line1);
            translate([-((len_text)/2)*FontSize*FontSpace,3*FontSize*LineSpace,0]) WriteText(line1,FontSize);
            translate([-((len_text)/2)*FontSize*FontSpace,3*(FontSize*LineSpace-1),0]) cube([(len_text)*FontSize*FontSpace,1.5+1+(FontSize*(LineSpace-1)),1]);
        }
    }
}


module WriteText (textstring, fontsize){
    len_text = len(textstring);
    for (i=[0:1:(len_text-1)]) {
        if(textstring[i]=="i"){
            translate([((i+.5)*FontSpace*FontSize),0,0]) HighDots(textstring[i]);
        }
        else if(textstring[i]=="j"){
            translate([((i+.5)*FontSpace*FontSize),0,0]) HighDots(textstring[i]);
        }
        else if(textstring[i]=="?"){
            translate([((i+.5)*FontSpace*FontSize),0,0]) LowDots(textstring[i]);
        }
        else if(textstring[i]=="!"){
            translate([((i+.5)*FontSpace*FontSize),0,0]) LowDots(textstring[i]);
        }
        else if(textstring[i]==":"){
            translate([((i+.5)*FontSpace*FontSize),0,0]) LowDots(textstring[i]);
        }
        else if(textstring[i]==";"){
            translate([((i+.5)*FontSpace*FontSize),0,0]) LowDots(textstring[i]);
        }
        else {
            translate([((i+.5)*FontSpace*FontSize),0,0]) {
            linear_extrude(height=FontExtrude,convexity=10)
                text(textstring[i],size=FontSize,font=FontName,halign="center",valign="baseline");
            }
        }
    }
}
module HighDots(letter){
     union(){
         translate([0,0,0]) hull(){
             difference(){
                linear_extrude(1) text(letter,size=FontSize,font=FontName,halign="center",valign="baseline");
                translate([-FontSize/2,-(FontSize)/3,-0.5]) cube([FontSize,FontSize,2]);
             }
         }
         linear_extrude(height=FontExtrude,convexity=10)
            text(letter,size=FontSize,font=FontName,halign="center",valign="baseline");
        }
}
 module LowDots(letter){
     union(){
         translate([0,0,0]) hull(){
             difference(){
                 linear_extrude(1) text(letter,size=FontSize,font=FontName,halign="center",valign="baseline");
                 translate([-FontSize/2,FontSize/3,-0.5]) cube([FontSize,FontSize,2]);
             }
         }
         linear_extrude(height=FontExtrude,convexity=10)
            text(letter,size=FontSize,font=FontName,halign="center",valign="baseline");
        }
}
 
//
//Draw the tab.
module TAB (){
    rotate([0,0,180]) difference(){
        hull(){ //outer shell
            translate([-tabX/2,2,0]) cube([tabX,tabY,tabZ]);
            translate([-tabX/2,-tabHead,0]) cube([tabX,tabHead,tabZ]);
            translate([-((tabX/2)-rad),tabY+tabClip-rad,0]) cylinder(h=tabZ, r=rad, $fn=25);
            translate([((tabX/2)-rad),tabY+tabClip-rad,0]) cylinder(h=tabZ, r=rad, $fn=25);
        }
        translate([-(tabX*1.1)/2,-tabHead-.1,2]) cube(size=[tabX*1.1,tabY+tabHead+.1,tabZ]);
        translate([-(tabX*1.1)/2,tabY+(0.3*tabClip),tabZ]) rotate([-40,0,0]) cube([tabX*1.1,10,5]);
    }
}
